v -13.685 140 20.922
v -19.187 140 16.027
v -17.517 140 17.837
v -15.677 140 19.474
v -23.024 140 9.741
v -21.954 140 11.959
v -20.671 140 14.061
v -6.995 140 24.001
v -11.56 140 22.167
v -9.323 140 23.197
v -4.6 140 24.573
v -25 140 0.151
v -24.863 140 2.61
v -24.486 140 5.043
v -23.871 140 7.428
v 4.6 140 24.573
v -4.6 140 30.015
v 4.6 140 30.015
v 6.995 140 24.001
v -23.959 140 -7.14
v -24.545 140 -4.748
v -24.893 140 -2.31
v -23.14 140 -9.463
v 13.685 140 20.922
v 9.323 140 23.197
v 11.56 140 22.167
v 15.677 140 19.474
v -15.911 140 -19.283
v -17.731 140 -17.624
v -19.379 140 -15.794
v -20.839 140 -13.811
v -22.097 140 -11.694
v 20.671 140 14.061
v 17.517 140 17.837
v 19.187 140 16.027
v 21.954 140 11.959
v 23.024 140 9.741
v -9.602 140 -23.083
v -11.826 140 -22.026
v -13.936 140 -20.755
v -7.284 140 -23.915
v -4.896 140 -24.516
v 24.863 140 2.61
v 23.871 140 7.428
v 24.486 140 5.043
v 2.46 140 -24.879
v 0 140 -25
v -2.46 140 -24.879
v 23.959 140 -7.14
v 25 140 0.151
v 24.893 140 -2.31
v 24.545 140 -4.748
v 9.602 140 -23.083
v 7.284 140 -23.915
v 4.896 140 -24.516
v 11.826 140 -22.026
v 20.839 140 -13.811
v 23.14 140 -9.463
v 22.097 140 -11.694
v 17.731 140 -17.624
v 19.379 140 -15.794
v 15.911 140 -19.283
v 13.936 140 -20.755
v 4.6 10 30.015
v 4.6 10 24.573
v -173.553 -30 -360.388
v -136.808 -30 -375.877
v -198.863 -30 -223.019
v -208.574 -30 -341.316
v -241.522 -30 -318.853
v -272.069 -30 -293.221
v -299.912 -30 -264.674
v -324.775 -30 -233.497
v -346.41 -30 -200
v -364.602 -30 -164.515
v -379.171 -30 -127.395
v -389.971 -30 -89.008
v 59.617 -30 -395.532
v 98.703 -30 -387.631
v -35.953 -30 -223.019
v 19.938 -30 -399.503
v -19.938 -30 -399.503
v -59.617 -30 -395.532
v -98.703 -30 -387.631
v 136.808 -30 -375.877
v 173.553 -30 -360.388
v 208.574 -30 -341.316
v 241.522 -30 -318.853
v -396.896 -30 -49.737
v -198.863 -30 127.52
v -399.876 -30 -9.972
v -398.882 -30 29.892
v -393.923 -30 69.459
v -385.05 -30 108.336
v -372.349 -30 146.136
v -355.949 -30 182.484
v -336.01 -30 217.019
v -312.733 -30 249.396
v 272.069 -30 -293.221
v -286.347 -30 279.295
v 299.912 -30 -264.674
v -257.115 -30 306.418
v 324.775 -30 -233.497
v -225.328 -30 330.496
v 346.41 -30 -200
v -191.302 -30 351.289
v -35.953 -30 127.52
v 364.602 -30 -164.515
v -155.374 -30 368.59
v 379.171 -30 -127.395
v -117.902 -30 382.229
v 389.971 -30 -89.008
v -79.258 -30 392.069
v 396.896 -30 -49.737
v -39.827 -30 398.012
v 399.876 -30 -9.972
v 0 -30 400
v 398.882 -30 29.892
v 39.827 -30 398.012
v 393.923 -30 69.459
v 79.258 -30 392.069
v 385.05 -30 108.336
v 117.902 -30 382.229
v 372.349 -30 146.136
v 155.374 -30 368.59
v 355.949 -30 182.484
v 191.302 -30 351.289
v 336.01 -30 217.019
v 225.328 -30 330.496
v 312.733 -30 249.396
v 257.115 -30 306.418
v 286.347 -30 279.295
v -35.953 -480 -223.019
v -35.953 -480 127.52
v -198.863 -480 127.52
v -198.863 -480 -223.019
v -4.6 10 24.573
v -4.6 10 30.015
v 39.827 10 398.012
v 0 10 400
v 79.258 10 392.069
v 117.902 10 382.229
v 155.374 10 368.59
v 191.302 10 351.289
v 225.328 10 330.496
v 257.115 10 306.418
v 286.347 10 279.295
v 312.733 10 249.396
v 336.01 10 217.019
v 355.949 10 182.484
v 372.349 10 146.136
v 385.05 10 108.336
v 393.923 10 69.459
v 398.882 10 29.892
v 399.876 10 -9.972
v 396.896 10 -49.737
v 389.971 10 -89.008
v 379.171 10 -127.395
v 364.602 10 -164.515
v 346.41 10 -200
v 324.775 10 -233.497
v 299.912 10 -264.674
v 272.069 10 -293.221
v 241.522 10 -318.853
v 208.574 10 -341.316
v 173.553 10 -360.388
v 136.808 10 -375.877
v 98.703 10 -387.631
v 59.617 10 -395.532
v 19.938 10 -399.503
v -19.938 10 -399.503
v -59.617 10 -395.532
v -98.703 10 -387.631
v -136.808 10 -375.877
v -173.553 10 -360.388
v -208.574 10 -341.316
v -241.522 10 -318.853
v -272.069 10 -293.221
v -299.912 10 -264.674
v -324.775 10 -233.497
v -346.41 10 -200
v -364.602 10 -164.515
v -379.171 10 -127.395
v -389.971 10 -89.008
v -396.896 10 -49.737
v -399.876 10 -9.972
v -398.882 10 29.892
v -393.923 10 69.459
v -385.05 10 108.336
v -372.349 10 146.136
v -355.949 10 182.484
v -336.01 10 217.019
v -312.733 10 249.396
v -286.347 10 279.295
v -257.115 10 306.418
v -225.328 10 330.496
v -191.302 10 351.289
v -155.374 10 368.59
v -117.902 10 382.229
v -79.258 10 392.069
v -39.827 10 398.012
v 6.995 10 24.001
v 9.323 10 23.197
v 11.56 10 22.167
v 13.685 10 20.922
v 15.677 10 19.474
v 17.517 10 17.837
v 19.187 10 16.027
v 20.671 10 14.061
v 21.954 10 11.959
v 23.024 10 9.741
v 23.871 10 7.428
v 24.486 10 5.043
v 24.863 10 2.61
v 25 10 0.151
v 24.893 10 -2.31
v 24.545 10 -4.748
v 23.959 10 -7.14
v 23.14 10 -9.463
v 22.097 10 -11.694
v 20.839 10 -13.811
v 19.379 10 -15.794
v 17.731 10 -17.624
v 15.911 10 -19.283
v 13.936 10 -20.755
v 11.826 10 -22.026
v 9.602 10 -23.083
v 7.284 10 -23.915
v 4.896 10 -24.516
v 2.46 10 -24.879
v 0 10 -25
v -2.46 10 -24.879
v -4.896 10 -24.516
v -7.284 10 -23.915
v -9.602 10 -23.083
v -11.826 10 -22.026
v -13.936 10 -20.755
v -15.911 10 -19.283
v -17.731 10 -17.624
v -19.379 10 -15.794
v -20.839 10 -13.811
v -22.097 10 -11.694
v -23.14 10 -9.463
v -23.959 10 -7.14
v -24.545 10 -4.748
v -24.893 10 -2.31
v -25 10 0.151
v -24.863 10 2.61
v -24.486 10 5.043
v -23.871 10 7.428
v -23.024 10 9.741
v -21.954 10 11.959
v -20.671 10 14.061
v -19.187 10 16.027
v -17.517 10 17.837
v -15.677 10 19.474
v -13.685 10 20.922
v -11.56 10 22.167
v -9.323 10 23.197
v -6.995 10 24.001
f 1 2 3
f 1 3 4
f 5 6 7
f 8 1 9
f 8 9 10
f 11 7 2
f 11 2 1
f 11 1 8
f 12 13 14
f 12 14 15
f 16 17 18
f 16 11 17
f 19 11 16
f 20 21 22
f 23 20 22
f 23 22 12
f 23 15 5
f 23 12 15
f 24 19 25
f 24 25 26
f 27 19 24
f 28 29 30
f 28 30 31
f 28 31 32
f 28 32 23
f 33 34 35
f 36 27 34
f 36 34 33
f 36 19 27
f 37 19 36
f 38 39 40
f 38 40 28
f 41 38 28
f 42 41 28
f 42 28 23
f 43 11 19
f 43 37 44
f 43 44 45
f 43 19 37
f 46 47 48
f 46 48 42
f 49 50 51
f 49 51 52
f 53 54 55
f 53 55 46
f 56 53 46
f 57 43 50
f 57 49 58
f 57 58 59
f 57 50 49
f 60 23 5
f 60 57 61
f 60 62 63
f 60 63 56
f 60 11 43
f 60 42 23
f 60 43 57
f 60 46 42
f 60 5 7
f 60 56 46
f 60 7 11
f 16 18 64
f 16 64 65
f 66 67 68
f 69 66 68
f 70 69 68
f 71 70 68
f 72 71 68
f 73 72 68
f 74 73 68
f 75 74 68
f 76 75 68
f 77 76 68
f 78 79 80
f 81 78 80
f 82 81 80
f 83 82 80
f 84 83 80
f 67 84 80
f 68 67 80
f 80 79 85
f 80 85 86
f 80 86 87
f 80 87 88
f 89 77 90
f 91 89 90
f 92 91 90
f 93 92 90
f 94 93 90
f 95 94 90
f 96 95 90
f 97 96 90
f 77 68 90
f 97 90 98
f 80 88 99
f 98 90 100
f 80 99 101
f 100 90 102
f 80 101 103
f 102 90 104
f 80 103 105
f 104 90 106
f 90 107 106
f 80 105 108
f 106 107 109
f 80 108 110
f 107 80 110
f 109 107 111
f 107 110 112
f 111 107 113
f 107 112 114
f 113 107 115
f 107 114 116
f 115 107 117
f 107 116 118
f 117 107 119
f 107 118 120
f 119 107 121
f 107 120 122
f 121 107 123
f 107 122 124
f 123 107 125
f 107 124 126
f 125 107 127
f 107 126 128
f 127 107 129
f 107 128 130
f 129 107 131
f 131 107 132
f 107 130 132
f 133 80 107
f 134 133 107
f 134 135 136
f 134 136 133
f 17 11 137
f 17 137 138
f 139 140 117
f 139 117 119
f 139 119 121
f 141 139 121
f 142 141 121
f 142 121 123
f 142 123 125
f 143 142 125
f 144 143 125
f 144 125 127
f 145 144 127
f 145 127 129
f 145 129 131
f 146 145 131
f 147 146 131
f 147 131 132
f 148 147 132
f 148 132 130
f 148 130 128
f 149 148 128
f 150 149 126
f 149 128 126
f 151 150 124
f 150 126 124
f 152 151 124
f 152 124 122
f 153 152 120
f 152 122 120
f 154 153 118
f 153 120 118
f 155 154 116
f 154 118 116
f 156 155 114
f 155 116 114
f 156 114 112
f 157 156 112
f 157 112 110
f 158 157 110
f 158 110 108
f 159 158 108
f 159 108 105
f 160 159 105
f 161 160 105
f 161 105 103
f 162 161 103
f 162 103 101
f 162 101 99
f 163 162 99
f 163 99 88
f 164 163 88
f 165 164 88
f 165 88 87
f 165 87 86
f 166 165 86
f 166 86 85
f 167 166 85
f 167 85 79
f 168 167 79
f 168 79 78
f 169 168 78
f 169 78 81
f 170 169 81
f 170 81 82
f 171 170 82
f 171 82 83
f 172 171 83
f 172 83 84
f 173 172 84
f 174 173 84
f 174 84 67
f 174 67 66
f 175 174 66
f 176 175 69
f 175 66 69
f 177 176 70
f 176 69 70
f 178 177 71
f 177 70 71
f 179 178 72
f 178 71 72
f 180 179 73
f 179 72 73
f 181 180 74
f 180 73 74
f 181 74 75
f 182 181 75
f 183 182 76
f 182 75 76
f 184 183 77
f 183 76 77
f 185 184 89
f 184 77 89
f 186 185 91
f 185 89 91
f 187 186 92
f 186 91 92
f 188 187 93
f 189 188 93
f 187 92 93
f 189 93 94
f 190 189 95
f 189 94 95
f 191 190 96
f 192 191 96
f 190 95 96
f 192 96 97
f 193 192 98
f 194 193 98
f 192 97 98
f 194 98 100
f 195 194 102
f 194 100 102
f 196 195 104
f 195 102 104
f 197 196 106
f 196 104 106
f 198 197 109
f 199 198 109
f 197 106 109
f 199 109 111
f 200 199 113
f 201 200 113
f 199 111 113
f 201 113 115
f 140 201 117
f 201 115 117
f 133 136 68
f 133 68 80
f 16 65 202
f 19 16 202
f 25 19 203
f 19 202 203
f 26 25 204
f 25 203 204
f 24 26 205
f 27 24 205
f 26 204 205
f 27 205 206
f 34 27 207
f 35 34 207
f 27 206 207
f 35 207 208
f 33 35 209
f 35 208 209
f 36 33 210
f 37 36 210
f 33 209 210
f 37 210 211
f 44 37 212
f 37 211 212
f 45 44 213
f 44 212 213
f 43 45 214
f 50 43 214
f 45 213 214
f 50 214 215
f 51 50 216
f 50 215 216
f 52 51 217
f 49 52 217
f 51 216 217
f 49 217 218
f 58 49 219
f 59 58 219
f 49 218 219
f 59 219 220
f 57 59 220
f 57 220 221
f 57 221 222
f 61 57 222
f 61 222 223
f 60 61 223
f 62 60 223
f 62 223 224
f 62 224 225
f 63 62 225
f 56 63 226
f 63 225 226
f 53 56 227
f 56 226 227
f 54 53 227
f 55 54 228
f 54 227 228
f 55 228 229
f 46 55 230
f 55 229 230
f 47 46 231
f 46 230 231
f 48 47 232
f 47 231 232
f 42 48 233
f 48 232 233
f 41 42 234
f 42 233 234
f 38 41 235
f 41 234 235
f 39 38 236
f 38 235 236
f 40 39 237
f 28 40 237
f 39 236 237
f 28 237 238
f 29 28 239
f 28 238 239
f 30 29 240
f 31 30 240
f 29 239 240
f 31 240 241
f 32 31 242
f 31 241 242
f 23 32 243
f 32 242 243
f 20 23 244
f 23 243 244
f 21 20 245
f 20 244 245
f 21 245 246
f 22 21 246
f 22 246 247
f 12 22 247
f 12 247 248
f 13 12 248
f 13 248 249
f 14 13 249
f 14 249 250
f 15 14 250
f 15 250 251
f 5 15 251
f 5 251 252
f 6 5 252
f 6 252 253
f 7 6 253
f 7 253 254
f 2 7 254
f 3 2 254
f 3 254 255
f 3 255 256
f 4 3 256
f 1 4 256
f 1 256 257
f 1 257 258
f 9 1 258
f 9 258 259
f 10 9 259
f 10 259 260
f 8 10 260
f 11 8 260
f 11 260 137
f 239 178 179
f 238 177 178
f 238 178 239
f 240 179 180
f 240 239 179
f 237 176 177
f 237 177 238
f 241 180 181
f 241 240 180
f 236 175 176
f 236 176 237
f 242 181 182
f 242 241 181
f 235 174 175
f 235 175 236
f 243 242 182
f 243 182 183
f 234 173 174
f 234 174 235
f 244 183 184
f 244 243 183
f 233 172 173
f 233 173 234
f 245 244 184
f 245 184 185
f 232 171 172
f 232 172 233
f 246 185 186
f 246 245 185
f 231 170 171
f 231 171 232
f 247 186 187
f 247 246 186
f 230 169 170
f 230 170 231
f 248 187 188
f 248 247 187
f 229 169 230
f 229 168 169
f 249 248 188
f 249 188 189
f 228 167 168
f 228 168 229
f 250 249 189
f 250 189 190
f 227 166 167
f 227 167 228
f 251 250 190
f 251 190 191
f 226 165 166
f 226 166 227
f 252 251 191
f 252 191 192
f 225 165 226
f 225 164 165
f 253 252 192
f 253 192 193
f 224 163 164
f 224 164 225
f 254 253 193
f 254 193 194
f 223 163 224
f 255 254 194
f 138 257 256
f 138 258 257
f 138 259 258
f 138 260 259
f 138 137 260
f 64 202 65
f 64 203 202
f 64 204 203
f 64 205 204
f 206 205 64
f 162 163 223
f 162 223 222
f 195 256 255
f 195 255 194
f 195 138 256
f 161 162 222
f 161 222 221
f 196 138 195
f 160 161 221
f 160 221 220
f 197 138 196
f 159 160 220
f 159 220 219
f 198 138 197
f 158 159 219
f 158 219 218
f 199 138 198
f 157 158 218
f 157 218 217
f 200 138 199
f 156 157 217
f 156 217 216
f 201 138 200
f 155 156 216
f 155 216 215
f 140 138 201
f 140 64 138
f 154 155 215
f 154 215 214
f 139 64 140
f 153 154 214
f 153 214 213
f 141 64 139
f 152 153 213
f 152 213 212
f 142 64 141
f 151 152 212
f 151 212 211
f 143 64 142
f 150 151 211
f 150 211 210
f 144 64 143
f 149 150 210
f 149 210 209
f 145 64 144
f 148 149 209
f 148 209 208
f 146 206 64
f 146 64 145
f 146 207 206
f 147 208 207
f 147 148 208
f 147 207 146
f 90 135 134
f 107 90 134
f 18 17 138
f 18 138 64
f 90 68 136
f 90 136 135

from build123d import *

# Parameters (mm, degrees)
SKETCH1_R           = 400
BOSS_EXTRUDE1_DEPTH = 10
BOSS_EXTRUDE5_DEPTH = 130
BOSS_EXTRUDE6_START = -30
SKETCH1_4_R         = 400
BOSS_EXTRUDE6_DEPTH = 30
SKETCH4_W           = 162.910444241
SKETCH4_H           = 350.538335194
BOSS_EXTRUDE7_DEPTH = 450


with BuildPart() as part:
    # Sketch1 → Boss-Extrude1 (new body)
    with BuildSketch(Plane(origin=(0, 0, 0), x_dir=(1, 0, 0), z_dir=(0, 1, 0))):
        Circle(SKETCH1_R)
    extrude(amount=BOSS_EXTRUDE1_DEPTH)

    # Sketch3 → Boss-Extrude5 (add)
    with BuildSketch(Plane(origin=(0, 10, 0), x_dir=(1, 0, 0), z_dir=(0, 1, 0))):
        with BuildLine():
            Line((-4.6, -30.015), (4.6, -30.015))
            Line((4.6, -30.015), (4.6, -24.573156085))
            ThreePointArc((4.6, -24.573156085), (0, 25), (-4.6, -24.573156085))
            Line((-4.6, -24.573156085), (-4.6, -30.015))
        make_face()
    extrude(amount=BOSS_EXTRUDE5_DEPTH)

    # Sketch1<4> → Boss-Extrude6 (add)
    with BuildSketch(Plane(origin=(0, 0, 0), x_dir=(1, 0, 0), z_dir=(0, 1, 0)).offset(BOSS_EXTRUDE6_START)):
        Circle(SKETCH1_4_R)
    extrude(amount=BOSS_EXTRUDE6_DEPTH)

    # Sketch4 → Boss-Extrude7 (add)
    with BuildSketch(Plane.XZ.offset(30)):
        with Locations((-117.407871884, -47.749612967)):
            Rectangle(SKETCH4_W, SKETCH4_H)
    extrude(amount=BOSS_EXTRUDE7_DEPTH)


solid = part.part
